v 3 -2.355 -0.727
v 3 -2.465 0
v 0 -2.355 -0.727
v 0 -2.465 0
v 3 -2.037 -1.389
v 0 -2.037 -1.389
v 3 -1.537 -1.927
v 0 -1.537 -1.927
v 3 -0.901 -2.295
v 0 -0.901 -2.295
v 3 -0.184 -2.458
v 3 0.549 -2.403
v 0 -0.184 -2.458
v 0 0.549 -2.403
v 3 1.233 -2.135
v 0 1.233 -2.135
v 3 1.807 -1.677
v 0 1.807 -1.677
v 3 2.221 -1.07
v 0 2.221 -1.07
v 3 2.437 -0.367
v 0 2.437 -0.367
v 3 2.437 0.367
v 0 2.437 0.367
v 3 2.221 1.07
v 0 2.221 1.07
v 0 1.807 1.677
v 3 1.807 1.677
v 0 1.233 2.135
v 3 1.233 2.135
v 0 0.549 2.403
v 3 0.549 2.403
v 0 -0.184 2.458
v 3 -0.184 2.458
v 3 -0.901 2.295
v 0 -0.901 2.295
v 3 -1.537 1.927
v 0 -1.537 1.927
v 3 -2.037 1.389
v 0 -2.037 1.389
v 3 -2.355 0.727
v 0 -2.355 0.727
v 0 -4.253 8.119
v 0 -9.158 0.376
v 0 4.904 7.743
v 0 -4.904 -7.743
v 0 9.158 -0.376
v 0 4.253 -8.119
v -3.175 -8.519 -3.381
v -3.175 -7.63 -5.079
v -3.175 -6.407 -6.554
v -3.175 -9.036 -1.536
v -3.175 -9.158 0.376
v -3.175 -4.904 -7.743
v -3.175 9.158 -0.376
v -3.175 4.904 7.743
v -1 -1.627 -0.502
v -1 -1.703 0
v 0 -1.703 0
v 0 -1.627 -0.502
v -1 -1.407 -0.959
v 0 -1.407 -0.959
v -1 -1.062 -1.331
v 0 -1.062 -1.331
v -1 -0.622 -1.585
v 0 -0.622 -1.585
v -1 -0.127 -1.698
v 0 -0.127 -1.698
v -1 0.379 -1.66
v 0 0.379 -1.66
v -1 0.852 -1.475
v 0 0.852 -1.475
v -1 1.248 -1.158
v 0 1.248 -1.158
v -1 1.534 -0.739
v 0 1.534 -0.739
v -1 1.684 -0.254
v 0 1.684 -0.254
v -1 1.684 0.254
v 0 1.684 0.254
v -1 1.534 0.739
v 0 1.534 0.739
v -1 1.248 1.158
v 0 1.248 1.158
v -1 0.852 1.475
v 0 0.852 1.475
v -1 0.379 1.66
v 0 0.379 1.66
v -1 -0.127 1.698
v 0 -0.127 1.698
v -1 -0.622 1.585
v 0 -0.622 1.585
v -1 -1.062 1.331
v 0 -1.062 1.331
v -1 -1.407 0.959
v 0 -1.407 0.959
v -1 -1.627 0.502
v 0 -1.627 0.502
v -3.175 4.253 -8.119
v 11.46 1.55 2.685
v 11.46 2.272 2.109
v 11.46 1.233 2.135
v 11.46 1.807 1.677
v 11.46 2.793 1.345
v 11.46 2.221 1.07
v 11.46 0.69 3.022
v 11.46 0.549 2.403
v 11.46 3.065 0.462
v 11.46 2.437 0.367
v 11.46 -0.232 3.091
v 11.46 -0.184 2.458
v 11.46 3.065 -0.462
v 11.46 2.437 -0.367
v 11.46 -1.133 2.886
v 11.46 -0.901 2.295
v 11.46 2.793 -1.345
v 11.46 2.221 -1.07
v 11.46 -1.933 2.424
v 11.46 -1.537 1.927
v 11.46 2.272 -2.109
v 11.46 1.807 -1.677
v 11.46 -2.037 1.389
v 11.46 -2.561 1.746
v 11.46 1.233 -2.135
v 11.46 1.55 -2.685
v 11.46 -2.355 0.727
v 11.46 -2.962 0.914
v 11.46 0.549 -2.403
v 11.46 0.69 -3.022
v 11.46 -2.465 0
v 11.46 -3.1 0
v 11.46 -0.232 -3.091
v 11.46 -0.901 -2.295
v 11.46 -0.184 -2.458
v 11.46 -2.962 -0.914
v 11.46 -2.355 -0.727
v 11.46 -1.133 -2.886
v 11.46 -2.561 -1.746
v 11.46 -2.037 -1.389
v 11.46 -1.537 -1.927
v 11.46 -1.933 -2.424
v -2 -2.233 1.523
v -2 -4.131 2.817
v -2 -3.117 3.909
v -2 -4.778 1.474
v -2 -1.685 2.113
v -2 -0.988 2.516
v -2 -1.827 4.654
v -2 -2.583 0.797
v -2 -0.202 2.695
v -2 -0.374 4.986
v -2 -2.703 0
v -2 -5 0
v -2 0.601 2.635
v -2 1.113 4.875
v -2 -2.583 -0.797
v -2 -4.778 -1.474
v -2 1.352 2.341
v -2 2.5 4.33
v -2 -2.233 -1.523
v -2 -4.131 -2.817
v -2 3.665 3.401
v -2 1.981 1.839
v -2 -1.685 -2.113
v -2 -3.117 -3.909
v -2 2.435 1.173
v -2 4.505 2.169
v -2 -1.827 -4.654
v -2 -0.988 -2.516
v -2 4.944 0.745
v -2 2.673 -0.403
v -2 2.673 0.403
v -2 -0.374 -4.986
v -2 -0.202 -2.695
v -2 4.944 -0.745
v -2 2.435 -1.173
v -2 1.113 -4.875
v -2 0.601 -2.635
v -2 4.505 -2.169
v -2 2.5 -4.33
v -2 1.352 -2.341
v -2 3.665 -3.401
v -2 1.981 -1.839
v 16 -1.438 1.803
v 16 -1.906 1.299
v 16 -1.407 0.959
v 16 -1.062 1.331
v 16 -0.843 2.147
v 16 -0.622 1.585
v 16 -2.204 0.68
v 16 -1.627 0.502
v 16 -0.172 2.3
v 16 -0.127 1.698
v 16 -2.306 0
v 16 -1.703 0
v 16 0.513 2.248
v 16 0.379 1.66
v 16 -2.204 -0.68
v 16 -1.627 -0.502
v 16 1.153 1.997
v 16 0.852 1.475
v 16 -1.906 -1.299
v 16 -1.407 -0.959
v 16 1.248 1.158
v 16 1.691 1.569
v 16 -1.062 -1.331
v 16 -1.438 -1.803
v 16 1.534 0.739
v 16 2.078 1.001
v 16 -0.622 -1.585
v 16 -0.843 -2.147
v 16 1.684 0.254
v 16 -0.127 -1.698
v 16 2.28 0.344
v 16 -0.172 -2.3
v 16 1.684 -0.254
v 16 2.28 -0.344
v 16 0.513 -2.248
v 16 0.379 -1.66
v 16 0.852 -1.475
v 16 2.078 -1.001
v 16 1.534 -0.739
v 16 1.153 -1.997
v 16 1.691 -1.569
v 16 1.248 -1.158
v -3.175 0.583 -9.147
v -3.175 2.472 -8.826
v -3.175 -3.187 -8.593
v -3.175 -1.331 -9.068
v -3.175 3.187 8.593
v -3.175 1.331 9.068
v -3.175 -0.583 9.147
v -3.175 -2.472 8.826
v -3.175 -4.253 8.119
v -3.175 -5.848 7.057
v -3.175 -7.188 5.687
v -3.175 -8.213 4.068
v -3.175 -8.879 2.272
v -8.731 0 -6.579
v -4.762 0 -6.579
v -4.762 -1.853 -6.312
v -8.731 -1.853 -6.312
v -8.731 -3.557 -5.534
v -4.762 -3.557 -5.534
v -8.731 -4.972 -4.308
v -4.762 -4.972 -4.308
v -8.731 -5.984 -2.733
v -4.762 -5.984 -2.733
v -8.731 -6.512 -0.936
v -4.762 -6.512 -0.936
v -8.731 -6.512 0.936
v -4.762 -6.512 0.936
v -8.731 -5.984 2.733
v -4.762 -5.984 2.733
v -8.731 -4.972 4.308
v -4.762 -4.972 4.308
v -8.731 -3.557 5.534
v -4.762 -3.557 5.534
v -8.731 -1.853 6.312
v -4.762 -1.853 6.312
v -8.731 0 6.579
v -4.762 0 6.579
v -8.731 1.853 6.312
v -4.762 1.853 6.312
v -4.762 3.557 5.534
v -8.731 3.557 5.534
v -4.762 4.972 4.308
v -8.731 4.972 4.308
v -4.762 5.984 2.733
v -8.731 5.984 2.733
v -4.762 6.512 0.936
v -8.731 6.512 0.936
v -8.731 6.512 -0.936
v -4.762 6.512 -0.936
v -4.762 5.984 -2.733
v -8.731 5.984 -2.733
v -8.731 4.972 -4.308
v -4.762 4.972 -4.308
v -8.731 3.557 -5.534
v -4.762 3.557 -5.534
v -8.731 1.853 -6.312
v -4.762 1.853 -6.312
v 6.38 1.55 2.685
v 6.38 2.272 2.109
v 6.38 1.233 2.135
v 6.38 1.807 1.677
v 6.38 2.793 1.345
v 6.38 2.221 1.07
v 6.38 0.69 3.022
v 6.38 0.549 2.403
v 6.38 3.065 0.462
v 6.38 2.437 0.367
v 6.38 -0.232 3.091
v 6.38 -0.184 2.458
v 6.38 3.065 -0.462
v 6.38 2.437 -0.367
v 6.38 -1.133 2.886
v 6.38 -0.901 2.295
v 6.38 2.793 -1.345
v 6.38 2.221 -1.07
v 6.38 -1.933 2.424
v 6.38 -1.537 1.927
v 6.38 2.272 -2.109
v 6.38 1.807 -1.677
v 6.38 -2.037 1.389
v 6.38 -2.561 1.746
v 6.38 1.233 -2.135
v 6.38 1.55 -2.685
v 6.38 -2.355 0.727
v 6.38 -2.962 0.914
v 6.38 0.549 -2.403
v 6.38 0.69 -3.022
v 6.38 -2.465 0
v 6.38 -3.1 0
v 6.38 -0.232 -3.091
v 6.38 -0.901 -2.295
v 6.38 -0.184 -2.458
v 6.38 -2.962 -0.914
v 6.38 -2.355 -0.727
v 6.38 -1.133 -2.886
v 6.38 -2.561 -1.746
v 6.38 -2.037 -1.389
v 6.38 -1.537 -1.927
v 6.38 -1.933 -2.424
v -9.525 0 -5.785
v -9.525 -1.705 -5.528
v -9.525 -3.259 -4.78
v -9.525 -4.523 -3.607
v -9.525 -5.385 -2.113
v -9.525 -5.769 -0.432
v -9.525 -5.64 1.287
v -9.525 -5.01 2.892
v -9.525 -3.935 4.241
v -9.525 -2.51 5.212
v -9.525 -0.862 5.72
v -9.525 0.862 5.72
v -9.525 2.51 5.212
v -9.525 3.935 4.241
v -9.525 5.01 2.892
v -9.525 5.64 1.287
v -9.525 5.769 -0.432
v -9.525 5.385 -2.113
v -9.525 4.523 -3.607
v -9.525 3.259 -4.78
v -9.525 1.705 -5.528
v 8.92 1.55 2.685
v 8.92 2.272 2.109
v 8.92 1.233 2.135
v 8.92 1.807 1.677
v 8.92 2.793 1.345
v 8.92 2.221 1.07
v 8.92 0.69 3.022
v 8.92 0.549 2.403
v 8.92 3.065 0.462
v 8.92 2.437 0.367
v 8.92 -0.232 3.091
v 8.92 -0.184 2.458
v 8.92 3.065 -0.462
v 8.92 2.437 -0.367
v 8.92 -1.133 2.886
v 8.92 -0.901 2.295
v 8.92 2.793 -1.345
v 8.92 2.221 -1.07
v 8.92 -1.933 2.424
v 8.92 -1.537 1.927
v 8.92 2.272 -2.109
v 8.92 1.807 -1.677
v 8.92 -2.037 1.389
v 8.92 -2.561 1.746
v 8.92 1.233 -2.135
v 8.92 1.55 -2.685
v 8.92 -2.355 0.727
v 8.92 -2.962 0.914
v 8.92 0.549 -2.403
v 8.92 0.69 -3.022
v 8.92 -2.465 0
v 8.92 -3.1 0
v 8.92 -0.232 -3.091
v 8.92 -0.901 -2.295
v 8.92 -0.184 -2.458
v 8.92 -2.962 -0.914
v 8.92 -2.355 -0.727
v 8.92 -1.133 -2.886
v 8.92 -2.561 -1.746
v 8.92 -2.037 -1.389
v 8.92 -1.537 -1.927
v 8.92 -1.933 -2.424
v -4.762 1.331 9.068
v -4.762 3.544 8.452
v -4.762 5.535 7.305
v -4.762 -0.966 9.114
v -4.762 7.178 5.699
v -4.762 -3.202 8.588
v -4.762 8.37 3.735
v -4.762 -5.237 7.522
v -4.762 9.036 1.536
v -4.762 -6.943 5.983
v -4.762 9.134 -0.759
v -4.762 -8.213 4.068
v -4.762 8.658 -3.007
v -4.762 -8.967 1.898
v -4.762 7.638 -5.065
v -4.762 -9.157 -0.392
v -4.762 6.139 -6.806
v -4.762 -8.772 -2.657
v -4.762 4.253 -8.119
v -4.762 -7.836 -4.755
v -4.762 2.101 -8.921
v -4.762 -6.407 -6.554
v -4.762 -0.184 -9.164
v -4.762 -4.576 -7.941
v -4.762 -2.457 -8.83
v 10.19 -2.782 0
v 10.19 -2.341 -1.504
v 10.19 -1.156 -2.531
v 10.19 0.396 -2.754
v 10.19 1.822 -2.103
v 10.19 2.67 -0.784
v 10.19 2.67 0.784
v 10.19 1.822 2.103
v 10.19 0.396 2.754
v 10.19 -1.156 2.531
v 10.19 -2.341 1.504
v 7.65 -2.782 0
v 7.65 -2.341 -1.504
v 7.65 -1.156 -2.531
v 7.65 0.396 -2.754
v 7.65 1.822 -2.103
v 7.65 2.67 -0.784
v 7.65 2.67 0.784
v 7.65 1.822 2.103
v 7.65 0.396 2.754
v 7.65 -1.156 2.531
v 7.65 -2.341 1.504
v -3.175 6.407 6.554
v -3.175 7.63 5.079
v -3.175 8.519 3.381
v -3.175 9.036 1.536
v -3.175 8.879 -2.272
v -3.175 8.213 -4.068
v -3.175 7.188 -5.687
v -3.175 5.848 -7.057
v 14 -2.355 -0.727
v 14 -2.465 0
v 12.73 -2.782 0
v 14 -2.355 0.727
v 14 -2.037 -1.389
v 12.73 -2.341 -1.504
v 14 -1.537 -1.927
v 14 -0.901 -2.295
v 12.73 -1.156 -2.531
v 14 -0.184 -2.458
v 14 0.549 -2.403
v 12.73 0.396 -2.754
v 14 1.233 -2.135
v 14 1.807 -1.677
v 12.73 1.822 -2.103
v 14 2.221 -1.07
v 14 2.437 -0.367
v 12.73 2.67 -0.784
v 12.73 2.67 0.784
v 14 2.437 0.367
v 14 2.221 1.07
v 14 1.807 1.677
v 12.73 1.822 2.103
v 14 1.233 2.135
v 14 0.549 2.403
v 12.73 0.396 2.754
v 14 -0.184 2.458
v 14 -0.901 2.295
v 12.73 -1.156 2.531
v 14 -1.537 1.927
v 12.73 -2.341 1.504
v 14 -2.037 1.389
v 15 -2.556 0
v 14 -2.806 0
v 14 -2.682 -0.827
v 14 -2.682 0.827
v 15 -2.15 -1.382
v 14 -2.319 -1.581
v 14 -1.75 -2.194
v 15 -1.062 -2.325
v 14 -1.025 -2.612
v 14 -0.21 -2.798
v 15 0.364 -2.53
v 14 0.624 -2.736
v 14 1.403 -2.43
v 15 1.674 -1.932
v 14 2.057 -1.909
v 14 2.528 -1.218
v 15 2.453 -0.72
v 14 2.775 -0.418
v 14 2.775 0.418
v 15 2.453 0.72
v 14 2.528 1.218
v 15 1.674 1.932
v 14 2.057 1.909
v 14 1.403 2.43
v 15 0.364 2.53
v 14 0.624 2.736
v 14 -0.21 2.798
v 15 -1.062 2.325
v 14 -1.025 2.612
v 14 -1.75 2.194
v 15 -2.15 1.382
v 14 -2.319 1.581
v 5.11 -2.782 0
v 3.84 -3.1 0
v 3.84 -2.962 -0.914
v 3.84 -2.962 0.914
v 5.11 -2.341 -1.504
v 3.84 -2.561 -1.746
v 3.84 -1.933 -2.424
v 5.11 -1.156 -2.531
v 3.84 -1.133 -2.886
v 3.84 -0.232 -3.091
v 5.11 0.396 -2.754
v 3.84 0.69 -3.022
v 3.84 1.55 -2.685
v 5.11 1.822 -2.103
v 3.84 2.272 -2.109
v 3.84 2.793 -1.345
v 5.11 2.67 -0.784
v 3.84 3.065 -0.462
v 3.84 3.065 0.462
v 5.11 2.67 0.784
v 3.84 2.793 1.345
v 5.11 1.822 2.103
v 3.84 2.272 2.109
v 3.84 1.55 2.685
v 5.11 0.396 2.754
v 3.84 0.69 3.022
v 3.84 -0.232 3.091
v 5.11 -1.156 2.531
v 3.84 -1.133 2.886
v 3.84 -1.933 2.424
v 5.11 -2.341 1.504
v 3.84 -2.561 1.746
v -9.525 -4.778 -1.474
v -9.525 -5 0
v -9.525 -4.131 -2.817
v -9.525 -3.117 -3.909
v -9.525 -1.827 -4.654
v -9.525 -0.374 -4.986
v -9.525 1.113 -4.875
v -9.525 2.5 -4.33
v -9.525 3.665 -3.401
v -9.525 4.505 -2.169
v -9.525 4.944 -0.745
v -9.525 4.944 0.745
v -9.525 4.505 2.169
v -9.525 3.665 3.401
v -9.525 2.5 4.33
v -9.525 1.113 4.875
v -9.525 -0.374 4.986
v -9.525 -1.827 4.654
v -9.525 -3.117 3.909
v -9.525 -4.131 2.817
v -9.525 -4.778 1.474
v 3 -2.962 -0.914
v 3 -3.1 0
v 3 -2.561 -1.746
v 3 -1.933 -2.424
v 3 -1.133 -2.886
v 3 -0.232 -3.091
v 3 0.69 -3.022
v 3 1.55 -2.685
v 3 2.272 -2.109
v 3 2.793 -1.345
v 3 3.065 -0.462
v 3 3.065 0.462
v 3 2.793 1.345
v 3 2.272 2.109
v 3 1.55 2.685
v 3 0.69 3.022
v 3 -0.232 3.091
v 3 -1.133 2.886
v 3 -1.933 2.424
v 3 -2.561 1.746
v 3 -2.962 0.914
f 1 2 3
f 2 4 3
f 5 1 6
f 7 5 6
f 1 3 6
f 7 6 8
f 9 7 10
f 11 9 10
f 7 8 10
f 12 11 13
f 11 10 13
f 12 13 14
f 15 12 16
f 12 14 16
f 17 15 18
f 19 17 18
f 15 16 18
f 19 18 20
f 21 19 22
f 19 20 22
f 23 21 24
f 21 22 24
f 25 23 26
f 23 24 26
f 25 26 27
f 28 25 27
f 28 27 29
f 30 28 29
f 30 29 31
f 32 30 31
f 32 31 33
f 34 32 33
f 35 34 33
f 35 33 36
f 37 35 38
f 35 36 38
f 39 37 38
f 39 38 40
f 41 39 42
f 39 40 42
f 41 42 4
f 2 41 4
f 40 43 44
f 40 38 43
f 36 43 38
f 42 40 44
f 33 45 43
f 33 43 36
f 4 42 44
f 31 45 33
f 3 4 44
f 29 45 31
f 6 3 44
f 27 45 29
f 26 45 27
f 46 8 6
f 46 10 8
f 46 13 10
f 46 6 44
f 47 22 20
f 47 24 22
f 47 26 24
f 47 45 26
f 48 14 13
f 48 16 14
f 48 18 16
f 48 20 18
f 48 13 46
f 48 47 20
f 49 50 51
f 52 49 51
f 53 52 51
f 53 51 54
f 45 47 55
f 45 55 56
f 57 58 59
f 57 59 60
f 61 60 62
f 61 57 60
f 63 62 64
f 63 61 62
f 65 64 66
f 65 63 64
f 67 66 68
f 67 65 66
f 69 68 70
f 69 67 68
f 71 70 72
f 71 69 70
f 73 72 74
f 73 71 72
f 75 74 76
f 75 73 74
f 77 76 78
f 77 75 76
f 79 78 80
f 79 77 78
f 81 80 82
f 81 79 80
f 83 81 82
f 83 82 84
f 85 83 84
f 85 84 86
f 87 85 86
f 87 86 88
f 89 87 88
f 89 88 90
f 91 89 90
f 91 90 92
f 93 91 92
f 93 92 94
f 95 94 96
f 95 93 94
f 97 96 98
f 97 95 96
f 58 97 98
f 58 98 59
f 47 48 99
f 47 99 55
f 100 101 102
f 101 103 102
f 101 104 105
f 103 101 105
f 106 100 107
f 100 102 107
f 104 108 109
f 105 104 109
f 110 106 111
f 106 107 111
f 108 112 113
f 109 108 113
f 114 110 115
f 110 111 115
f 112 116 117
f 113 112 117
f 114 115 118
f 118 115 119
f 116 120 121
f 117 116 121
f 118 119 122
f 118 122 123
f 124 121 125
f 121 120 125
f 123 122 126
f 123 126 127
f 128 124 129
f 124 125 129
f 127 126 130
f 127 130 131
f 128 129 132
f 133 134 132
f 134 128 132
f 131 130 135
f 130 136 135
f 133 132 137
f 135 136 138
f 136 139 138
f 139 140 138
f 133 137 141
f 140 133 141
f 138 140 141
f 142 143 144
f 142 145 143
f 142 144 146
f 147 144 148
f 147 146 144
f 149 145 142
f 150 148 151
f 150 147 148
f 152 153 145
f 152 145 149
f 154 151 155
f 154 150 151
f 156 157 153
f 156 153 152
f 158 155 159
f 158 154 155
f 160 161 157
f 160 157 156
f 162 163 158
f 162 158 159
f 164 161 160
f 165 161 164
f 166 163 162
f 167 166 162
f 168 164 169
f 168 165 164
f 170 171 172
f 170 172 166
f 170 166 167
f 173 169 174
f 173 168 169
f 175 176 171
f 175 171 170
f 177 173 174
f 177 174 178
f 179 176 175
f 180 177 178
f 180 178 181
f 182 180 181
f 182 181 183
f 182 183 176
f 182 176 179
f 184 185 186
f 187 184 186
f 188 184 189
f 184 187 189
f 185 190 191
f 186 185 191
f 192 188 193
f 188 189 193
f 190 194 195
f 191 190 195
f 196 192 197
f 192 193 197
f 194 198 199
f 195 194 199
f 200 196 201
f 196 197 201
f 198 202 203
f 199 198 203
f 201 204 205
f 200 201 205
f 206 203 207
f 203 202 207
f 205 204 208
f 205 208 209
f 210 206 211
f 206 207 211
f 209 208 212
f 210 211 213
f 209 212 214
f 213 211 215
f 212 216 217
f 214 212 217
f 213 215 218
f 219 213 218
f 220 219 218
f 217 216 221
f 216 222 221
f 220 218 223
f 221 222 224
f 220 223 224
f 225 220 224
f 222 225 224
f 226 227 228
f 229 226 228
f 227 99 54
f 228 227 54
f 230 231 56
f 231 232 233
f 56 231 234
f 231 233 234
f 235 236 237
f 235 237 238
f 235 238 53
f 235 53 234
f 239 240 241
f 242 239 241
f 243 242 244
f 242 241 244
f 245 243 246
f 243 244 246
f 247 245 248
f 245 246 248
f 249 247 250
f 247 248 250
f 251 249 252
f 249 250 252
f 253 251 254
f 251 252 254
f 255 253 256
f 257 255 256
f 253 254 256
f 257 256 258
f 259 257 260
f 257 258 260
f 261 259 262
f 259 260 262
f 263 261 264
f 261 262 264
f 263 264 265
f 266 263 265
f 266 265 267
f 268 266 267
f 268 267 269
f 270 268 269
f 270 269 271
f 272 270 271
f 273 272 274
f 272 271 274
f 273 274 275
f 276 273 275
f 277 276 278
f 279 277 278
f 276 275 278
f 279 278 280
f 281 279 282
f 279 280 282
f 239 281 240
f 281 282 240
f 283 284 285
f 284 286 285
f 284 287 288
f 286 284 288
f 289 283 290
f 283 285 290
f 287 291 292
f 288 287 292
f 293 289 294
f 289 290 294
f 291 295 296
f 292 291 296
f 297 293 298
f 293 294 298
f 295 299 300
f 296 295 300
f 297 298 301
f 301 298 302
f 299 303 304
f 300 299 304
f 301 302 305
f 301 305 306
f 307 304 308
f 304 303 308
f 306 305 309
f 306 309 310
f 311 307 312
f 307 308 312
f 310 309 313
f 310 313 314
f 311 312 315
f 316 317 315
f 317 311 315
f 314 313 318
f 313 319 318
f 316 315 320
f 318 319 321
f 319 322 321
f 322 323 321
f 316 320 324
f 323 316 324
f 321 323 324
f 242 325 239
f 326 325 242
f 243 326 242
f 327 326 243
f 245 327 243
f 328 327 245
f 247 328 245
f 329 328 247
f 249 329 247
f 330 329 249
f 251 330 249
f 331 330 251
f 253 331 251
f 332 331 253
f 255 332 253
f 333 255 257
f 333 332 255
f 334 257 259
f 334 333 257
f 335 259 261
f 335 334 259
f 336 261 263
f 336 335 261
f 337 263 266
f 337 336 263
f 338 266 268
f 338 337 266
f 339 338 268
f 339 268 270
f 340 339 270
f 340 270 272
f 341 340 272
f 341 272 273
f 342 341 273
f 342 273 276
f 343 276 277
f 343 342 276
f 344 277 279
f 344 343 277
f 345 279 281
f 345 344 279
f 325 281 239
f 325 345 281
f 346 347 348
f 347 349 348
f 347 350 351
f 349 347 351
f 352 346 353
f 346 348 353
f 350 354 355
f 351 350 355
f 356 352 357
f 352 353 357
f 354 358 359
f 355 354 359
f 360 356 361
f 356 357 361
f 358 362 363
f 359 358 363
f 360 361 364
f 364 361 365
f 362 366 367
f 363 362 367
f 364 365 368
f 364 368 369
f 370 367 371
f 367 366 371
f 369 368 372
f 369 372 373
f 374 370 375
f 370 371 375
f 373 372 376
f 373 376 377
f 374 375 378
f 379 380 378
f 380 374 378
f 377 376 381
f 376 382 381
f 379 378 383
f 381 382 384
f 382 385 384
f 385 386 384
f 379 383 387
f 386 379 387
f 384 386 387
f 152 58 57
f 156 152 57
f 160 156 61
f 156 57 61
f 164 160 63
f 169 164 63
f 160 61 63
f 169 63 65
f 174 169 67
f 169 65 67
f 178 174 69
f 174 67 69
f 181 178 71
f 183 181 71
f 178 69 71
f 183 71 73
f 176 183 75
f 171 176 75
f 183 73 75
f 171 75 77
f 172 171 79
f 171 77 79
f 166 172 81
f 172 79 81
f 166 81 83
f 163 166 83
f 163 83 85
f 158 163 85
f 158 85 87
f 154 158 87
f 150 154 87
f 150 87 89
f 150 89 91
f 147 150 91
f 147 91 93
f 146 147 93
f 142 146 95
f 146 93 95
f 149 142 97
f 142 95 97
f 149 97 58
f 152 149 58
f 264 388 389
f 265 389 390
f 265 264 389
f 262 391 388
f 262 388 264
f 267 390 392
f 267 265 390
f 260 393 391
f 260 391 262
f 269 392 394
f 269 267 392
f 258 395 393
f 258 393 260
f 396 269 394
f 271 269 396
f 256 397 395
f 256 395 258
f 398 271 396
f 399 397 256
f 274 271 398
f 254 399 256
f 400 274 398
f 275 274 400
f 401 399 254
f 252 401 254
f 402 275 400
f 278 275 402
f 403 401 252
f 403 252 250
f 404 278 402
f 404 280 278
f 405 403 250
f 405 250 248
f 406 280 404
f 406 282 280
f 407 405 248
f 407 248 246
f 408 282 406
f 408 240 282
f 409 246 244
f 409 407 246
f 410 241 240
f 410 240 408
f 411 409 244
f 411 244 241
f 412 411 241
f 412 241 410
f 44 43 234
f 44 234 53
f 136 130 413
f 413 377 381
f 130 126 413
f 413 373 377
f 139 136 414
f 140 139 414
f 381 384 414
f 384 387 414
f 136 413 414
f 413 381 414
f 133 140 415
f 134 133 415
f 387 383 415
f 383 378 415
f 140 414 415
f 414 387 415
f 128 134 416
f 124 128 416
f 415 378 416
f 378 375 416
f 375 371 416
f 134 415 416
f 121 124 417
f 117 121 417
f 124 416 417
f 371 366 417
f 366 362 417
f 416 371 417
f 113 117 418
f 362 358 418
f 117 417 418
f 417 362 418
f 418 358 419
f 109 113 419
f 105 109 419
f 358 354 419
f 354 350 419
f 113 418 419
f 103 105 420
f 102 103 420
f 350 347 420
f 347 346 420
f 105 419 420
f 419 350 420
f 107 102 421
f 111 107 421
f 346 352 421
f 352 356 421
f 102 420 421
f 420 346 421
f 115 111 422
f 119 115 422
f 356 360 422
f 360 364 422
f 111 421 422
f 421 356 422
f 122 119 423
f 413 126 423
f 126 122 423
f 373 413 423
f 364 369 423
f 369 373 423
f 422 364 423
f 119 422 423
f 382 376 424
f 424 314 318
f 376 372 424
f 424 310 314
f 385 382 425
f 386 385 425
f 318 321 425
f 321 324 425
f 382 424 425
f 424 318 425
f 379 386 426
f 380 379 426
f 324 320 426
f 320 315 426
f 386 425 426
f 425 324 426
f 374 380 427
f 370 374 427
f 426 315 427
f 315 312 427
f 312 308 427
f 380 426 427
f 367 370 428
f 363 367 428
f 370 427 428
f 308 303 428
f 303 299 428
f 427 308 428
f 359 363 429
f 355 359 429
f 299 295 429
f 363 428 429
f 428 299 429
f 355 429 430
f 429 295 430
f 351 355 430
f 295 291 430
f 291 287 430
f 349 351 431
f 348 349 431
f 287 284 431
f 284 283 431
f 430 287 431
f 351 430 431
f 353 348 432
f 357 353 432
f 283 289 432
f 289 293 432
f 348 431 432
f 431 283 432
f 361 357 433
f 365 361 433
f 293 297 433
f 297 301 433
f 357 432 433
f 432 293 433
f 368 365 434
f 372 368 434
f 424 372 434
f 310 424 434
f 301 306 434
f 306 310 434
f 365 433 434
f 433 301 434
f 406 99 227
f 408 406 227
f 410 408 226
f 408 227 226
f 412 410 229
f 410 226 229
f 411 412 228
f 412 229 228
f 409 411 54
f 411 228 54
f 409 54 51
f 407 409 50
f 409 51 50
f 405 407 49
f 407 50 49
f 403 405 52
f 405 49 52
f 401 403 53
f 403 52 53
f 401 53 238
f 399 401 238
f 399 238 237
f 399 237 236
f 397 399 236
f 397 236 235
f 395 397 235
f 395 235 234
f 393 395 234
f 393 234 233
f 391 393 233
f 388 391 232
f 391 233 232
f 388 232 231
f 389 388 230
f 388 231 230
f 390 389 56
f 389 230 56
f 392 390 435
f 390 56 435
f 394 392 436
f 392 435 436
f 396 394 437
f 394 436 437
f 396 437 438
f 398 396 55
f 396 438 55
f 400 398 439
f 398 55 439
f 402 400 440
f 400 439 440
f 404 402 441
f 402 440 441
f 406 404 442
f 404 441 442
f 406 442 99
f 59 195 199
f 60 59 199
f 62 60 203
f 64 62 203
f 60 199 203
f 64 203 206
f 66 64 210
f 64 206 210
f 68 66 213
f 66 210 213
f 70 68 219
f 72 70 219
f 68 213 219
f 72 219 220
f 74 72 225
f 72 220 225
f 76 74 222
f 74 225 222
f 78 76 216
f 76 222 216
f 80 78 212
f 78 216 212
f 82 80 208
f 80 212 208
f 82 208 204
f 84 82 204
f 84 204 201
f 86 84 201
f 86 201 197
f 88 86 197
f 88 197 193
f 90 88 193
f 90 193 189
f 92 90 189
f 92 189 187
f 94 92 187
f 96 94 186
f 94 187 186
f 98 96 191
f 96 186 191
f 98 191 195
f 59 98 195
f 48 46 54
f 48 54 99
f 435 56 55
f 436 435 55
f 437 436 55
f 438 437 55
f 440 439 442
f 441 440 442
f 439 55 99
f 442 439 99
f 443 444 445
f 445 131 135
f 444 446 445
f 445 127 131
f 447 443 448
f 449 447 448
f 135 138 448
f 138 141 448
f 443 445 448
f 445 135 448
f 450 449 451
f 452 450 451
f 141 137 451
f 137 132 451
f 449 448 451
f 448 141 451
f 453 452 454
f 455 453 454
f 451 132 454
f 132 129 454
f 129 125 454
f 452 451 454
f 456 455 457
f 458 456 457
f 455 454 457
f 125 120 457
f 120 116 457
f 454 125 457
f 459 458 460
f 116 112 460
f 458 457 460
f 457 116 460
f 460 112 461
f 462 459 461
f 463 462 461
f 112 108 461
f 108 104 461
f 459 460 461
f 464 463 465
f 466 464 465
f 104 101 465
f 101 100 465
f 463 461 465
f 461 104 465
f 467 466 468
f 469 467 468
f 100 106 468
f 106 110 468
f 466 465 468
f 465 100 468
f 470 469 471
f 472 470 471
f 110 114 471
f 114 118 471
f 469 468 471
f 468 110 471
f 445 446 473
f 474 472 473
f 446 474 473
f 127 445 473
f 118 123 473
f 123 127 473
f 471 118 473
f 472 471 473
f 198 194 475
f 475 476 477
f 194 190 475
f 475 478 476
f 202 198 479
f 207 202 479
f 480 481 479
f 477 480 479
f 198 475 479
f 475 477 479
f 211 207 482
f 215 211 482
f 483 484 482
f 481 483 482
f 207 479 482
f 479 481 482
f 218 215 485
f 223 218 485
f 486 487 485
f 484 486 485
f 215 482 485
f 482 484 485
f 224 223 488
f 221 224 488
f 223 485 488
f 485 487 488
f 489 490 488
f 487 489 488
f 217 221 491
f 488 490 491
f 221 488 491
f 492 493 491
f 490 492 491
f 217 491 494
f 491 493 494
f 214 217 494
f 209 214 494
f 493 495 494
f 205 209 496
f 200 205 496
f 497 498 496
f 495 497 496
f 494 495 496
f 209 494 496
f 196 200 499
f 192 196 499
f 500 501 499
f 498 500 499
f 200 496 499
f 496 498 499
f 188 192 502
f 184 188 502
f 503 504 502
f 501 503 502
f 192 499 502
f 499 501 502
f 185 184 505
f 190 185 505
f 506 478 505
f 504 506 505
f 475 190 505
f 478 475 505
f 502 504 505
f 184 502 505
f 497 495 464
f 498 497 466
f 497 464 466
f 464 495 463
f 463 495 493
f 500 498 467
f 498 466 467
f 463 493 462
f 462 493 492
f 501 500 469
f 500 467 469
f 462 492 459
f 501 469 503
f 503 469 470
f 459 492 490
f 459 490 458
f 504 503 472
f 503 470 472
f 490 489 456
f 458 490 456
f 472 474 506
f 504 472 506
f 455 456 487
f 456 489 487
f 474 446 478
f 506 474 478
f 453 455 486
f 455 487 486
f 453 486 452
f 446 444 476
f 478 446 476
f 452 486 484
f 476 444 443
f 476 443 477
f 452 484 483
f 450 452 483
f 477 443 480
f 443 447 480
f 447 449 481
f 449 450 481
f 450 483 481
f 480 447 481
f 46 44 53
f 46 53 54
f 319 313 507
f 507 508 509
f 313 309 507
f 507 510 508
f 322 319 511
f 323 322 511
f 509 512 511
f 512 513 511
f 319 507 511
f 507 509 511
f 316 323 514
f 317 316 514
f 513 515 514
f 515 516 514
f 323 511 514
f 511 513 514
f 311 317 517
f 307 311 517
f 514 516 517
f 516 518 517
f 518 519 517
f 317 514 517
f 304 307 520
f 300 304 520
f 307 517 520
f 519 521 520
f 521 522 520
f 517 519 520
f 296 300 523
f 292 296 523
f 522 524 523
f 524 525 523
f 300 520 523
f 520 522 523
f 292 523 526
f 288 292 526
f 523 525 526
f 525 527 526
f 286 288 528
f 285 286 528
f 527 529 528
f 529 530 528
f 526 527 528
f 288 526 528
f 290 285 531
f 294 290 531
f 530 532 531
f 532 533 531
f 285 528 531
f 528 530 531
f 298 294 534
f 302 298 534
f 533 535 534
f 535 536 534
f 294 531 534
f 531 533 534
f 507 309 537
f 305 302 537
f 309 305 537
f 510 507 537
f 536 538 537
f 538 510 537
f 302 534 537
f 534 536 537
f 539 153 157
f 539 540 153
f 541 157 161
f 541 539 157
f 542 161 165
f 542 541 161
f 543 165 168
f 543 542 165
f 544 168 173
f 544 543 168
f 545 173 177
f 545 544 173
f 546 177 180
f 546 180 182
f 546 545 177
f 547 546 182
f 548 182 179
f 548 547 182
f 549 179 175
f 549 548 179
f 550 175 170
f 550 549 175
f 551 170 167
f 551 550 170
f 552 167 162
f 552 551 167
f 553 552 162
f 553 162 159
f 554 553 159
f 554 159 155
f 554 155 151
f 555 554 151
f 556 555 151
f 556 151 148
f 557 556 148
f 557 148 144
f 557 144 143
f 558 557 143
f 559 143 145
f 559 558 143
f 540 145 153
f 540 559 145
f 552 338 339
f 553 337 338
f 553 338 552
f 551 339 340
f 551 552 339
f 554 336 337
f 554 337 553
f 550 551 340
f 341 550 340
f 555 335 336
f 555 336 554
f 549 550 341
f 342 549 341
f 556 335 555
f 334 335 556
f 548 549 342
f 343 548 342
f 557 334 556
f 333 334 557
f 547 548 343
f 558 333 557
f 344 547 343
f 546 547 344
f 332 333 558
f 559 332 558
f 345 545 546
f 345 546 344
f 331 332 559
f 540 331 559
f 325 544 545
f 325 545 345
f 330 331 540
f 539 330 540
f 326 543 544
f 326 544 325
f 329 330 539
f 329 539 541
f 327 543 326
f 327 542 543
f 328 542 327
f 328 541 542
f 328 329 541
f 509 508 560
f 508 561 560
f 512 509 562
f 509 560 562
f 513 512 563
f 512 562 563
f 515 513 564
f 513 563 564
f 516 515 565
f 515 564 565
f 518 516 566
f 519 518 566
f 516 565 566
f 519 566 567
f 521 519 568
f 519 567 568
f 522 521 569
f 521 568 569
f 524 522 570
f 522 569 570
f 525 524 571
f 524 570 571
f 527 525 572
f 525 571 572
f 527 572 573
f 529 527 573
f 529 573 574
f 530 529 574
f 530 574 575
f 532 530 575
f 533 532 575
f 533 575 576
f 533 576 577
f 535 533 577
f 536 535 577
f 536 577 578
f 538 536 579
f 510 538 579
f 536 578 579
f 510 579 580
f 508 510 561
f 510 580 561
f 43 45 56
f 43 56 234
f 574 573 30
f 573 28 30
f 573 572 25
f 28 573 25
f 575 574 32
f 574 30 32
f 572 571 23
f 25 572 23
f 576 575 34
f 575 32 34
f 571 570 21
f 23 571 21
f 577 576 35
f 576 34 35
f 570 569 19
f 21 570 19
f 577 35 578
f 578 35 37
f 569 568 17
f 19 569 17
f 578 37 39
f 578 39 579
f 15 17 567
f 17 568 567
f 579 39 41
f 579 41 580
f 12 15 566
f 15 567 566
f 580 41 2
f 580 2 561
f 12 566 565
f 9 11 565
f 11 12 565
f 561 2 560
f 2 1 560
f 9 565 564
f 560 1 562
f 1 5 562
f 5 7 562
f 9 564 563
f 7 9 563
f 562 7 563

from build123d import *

# Parameters (mm, degrees)
CHAMFER1_SIZE    = 0.79375
CHAMFER1_SIZE_2  = 3.175
EXTRUSION1_DEPTH = 3.175
ESQUISSE3_R      = 9.165435523
EXTRUSION2_DEPTH = 1.5875
ESQUISSE4_R      = 6.5786
THREAD1_DEPTH    = 4.7625
CHAMFER2_SIZE    = 0.79375
CHAMFER4_SIZE    = 1


with BuildPart() as part:
    # Esquisse1 → Revolution1 (revolve)
    with BuildSketch(Plane.XY, mode=Mode.PRIVATE) as revolution1_sk:
        Polygon((0, 1.703), (16, 1.703), (16, 3.1), (14, 3.1), (14, 2.465), (11.46, 3.1), (11.46, 2.465), (8.92, 3.1), (8.92, 2.465), (6.38, 3.1), (6.38, 2.465), (3.84, 3.1), (3, 3.1), (3, 2.465), (0, 2.465), align=None)
    revolve(revolution1_sk.sketch.rotate(Axis((0, 0, 0), (1, 0, 0)), 180), axis=Axis((0, 0, 0), (1, 0, 0)))

    # Chamfer1
    # the kernel refuses this chamfer: 3.175, 0.79375 mm, written as the material it takes off along each edge
    with BuildSketch(Plane(origin=(16, 0, 0), x_dir=(0, -1, 0), z_dir=(0, 0, 1))) as chamfer1_piece_1:
        Polygon((3.1 - CHAMFER1_SIZE, 0), (3.1, -CHAMFER1_SIZE_2), (3.1, 0), align=None)
    revolve(axis=Axis((16, 0, 0), (1, 0, 0)), mode=Mode.SUBTRACT)

    # Esquisse2 → Extrusion1 (add)
    with BuildSketch(Plane.ZY):
        Polygon((0.375877143, -9.157724865), (-7.742883803, -4.904381587), (-8.118760946, 4.253343278), (-0.375877143, 9.157724865), (7.742883803, 4.904381587), (8.118760946, -4.253343278), align=None)
    extrude(amount=EXTRUSION1_DEPTH)

    # Esquisse3 → Extrusion2 (add)
    with BuildSketch(Plane.ZY.offset(3.175)):
        with Locations(Location((0, 0, 0), (0, 0, 152.350375514))):
            Circle(ESQUISSE3_R)
    extrude(amount=EXTRUSION2_DEPTH)

    # Esquisse4 → Thread1 (add)
    with BuildSketch(Plane.ZY.offset(4.7625)):
        with Locations(Location((0, 0, 0), (0, 0, 180))):
            Circle(ESQUISSE4_R)
    extrude(amount=THREAD1_DEPTH)

    # Chamfer2
    chamfer2_edges = [part.edges().sort_by_distance(p)[0] for p in [
        (-9.525, 0, 6.5786),
    ]]
    chamfer(chamfer2_edges, length=CHAMFER2_SIZE)

    # Sketch1 → Cut-Revolve1 (revolve, cut)
    with BuildSketch(Plane(origin=(0, 0, 0), x_dir=(1, 0, 0), z_dir=(0, 1, 0)), mode=Mode.PRIVATE) as cut_revolve1_sk:
        Polygon((0, -1.703), (-2, -1.703), (-2, -5), (-9.525, -5), (-9.525, 0), (0, 0), align=None)
    revolve(cut_revolve1_sk.sketch.rotate(Axis((-9.525, 0, 0), (1, 0, 0)), 90), axis=Axis((-9.525, 0, 0), (1, 0, 0)), mode=Mode.SUBTRACT)

    # Chamfer4
    chamfer4_edges = [part.edges().sort_by_distance(p)[0] for p in [
        (-2, 1.703, 0),
    ]]
    chamfer(chamfer4_edges, length=CHAMFER4_SIZE)


solid = part.part
